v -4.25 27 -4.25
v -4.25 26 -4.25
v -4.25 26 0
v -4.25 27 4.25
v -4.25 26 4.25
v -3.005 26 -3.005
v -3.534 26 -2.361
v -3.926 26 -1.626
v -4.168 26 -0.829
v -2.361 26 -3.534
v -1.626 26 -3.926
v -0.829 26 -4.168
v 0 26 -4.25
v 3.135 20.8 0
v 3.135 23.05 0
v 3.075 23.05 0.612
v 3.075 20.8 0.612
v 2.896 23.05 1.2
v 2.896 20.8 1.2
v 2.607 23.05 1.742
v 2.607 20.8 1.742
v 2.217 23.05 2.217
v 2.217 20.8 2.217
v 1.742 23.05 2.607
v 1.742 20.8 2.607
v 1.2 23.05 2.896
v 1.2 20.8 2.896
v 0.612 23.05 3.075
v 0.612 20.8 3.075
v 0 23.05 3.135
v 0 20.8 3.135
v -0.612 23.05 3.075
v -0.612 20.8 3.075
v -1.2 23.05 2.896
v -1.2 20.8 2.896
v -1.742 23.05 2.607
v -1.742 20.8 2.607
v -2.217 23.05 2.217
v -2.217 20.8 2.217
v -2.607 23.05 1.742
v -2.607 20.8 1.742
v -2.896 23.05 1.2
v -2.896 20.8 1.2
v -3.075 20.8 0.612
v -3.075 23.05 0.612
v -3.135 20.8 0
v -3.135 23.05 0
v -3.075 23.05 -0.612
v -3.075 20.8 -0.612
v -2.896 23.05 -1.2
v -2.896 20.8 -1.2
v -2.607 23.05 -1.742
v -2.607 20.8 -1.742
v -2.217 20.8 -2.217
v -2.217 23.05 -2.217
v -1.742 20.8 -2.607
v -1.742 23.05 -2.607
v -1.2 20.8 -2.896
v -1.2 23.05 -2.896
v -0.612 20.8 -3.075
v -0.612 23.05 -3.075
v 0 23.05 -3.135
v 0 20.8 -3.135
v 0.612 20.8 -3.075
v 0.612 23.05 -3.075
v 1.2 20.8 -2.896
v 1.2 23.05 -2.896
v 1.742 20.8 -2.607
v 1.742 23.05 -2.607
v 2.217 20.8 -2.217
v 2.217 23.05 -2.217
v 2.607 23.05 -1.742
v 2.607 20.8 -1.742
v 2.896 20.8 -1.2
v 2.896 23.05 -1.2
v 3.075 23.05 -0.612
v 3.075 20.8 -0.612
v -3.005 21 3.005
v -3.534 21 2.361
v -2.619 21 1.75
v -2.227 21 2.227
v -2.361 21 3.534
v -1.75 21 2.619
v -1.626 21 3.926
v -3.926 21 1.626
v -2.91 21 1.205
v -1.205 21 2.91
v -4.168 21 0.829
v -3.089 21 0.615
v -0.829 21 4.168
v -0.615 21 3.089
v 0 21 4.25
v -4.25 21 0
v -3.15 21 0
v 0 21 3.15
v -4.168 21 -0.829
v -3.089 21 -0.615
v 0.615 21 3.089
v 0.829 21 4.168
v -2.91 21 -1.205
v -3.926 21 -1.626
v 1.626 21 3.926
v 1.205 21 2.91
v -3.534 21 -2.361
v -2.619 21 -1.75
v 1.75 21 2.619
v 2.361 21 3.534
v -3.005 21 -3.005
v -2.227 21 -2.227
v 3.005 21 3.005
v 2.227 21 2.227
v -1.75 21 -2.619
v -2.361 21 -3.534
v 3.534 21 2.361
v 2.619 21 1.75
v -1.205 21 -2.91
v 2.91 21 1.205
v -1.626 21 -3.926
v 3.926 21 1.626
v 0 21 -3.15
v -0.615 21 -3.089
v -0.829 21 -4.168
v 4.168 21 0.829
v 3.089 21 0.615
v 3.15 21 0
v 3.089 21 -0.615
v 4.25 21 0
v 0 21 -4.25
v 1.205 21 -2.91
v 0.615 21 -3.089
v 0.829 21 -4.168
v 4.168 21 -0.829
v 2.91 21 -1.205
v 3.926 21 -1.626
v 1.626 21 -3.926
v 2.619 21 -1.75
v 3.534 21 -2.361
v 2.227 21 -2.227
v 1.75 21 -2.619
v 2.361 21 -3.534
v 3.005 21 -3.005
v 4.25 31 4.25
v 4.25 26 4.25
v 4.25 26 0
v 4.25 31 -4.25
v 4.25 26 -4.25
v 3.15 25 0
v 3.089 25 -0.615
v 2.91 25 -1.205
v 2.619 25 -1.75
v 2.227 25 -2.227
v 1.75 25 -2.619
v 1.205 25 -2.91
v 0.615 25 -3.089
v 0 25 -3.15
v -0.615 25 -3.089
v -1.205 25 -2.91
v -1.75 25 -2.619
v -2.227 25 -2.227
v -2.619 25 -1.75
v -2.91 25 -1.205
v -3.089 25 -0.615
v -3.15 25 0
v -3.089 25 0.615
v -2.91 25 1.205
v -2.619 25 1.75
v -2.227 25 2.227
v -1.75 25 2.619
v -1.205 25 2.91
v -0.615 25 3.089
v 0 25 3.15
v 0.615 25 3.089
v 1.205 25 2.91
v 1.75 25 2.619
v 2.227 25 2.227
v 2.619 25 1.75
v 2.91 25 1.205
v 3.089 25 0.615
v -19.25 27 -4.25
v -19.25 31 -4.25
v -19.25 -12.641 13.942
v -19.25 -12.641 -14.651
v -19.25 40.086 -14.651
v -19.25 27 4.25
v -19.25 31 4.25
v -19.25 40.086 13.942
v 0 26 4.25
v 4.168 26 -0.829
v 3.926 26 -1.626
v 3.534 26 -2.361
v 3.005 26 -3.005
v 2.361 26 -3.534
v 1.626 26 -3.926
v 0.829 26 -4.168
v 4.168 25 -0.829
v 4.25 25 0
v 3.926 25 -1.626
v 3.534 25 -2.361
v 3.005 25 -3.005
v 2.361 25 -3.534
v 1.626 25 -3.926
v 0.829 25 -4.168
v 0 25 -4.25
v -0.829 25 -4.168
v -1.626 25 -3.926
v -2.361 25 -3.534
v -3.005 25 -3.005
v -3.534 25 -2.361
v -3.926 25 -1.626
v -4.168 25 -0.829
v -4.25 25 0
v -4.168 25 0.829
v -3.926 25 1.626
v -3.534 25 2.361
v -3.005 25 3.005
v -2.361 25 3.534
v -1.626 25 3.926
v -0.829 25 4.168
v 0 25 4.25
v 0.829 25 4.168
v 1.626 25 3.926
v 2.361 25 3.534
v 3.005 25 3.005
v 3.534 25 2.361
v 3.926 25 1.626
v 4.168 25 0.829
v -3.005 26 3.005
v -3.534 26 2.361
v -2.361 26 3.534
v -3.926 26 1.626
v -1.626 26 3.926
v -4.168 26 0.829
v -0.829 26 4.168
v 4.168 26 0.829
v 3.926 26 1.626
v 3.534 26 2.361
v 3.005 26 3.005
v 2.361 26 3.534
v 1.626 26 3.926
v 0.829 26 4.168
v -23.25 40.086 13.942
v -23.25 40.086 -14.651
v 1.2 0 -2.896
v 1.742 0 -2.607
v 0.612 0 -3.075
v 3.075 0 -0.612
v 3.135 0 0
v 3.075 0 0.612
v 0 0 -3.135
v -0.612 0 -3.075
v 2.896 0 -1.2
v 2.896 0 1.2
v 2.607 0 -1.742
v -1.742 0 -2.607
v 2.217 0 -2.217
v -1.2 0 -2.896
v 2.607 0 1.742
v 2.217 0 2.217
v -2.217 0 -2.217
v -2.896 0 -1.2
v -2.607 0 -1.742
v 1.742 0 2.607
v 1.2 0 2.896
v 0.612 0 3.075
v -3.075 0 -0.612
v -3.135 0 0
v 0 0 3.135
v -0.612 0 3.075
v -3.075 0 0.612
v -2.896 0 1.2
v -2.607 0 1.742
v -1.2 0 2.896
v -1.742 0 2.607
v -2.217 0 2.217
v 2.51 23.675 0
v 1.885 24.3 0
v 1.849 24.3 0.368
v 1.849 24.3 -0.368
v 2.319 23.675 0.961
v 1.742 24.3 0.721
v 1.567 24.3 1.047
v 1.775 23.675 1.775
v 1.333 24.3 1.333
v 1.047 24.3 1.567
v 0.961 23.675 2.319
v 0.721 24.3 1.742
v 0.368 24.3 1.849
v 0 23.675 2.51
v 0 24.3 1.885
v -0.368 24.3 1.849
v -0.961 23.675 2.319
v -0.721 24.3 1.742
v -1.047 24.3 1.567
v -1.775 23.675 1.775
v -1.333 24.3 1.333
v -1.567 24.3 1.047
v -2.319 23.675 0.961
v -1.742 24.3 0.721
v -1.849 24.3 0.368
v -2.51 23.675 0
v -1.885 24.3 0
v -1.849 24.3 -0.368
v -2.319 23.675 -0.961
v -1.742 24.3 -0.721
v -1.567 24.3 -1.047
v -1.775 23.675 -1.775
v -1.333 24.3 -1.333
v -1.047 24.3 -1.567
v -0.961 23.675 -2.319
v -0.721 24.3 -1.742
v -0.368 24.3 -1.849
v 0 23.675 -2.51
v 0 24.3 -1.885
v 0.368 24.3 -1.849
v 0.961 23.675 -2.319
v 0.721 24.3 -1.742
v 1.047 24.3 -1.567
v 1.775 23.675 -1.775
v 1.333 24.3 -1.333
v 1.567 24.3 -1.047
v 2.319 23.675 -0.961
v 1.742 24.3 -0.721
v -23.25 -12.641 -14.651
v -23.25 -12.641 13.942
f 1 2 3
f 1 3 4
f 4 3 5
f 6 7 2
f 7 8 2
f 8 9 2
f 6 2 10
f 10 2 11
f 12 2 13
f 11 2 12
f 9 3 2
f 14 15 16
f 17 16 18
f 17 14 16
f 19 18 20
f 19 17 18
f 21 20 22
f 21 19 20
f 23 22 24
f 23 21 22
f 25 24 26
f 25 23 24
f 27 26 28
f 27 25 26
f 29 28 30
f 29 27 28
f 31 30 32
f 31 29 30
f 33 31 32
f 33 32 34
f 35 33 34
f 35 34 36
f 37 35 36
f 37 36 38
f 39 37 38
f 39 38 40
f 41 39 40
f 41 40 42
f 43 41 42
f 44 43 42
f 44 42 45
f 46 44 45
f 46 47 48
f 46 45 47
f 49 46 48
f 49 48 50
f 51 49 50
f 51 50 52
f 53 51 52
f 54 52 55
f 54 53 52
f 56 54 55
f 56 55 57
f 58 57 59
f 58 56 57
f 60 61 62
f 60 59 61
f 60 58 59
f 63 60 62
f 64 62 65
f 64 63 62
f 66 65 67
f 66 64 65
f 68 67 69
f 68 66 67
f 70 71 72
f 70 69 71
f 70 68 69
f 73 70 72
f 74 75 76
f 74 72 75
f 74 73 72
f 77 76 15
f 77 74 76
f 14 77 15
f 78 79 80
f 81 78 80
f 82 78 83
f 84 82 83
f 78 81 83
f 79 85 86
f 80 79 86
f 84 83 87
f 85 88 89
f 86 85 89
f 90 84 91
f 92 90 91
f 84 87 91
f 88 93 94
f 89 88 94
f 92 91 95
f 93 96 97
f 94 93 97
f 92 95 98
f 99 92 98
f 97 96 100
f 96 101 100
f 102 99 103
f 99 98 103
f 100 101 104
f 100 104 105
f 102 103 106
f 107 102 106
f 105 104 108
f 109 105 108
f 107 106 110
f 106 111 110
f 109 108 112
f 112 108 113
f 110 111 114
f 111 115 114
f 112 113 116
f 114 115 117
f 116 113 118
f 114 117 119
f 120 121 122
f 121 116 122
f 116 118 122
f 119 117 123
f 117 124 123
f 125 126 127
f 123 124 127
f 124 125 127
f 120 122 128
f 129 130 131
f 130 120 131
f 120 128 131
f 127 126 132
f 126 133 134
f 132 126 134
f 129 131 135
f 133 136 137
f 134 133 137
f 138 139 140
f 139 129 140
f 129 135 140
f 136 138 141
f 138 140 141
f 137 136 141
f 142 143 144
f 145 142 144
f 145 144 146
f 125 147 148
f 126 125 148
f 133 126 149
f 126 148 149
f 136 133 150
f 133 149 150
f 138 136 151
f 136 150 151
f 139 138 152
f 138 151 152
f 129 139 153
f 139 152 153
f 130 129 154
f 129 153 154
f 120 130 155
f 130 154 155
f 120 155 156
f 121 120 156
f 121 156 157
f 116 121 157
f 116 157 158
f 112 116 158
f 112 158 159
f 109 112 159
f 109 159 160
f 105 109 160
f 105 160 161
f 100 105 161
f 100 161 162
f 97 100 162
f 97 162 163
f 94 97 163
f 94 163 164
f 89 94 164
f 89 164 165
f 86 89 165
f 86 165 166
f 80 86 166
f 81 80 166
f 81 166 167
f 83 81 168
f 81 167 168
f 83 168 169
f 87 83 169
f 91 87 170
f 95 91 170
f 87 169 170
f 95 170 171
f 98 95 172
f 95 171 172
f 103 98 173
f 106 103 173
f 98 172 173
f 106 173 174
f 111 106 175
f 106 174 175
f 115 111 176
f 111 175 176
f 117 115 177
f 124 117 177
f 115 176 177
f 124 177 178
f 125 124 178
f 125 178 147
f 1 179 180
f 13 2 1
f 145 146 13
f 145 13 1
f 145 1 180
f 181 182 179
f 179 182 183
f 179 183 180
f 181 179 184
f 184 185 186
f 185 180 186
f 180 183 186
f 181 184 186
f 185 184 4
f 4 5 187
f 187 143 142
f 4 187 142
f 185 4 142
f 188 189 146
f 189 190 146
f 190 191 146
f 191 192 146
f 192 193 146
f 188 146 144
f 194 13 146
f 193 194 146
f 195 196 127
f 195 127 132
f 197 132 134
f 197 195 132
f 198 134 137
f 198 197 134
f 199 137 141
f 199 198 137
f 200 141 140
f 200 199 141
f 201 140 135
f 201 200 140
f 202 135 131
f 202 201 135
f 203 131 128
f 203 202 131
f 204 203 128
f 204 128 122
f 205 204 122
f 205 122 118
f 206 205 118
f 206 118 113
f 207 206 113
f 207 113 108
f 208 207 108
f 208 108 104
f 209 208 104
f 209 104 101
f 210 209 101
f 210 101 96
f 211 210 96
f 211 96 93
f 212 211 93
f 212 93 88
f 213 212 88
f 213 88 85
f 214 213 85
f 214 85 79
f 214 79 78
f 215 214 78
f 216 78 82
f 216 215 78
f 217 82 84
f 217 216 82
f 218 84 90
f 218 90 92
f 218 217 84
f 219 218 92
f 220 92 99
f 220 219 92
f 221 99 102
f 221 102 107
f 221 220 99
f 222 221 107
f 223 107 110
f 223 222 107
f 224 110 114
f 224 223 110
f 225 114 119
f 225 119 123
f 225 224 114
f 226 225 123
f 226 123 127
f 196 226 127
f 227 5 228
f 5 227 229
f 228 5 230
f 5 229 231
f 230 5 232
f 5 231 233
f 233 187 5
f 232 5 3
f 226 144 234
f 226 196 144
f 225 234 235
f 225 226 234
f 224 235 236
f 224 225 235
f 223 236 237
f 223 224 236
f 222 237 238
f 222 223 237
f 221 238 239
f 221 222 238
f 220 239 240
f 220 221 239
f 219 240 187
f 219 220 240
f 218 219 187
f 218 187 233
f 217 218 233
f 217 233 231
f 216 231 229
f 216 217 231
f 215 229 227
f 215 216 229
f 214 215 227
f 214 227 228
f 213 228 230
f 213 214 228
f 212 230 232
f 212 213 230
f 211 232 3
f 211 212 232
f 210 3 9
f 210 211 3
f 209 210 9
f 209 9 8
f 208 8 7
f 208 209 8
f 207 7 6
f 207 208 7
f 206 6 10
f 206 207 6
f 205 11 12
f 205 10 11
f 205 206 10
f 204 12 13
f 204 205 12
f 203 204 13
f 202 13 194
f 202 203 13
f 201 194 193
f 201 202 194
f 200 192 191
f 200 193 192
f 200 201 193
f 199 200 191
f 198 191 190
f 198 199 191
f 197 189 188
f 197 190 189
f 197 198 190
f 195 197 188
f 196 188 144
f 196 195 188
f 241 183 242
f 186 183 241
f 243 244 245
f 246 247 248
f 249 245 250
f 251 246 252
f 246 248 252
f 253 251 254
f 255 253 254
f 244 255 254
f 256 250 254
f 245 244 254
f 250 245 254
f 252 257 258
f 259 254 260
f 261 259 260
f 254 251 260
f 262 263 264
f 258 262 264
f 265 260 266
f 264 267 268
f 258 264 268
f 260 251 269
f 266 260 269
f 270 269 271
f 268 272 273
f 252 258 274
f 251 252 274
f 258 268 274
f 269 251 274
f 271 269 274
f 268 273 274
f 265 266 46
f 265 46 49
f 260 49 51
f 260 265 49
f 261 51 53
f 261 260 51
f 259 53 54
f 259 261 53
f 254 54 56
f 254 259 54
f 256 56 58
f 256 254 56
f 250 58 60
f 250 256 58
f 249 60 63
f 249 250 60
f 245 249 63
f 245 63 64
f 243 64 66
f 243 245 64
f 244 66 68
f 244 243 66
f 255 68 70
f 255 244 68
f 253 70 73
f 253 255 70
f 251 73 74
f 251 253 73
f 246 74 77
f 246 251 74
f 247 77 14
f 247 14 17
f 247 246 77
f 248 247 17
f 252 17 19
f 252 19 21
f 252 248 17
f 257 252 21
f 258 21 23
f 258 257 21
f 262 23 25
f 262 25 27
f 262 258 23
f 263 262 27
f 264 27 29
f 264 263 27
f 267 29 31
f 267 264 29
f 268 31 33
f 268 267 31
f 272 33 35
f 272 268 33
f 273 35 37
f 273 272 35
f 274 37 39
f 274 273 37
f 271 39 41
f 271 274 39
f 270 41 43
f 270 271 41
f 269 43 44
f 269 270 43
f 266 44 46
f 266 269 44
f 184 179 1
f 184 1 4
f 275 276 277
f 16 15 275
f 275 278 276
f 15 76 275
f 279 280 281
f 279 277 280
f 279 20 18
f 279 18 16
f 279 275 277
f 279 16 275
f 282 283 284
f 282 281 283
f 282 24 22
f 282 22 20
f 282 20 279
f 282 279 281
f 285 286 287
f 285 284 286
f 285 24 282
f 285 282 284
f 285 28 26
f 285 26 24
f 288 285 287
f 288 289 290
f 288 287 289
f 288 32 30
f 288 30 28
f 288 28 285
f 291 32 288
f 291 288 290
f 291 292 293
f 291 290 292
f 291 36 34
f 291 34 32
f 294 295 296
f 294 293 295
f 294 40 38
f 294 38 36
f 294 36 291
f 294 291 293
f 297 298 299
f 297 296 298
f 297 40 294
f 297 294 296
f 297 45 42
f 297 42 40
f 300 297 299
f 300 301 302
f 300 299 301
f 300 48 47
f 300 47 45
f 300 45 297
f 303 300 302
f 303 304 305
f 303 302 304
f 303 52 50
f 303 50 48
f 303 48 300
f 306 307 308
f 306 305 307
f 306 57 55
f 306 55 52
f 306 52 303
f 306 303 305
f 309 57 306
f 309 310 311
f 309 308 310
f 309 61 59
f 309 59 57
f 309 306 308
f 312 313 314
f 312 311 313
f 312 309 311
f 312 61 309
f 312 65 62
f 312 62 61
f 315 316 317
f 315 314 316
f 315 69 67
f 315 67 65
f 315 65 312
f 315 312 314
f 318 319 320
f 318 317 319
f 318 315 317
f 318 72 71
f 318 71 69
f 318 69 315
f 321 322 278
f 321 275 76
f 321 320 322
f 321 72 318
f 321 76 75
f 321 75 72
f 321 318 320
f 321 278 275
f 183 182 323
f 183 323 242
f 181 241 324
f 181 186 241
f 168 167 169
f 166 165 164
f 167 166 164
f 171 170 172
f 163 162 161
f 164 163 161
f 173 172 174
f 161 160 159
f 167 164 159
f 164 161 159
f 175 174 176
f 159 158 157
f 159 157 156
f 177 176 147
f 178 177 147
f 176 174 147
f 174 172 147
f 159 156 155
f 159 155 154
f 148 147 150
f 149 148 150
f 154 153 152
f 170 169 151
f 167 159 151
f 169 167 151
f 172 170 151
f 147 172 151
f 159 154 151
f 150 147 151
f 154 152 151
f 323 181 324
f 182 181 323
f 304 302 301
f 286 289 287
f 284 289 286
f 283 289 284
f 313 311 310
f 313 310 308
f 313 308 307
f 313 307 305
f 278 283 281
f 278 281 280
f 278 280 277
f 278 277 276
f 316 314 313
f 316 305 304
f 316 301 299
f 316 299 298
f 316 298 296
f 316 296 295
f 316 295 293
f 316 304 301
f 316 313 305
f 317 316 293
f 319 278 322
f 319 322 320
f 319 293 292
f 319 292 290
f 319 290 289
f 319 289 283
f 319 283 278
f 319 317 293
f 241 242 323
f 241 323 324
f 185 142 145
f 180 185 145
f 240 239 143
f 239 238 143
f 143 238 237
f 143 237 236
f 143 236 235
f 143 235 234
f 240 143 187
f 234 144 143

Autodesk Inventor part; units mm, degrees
ref_plane "YZ Plane" through (0, 0, 0) normal (1, 0, 0) x (0, 1, 0)
ref_plane "XZ Plane" through (0, 0, 0) normal (0, 1, 0) x (-1, 0, 0)
ref_plane "XY Plane" through (0, 0, 0) normal (0, 0, 1) x (1, 0, 0)
sketch "Sketch1" plane through (0, 0, 0) normal (0, 1, 0) x (-1, 0, 0)
  circle A0 centre (0, 0) radius 3.135
  dimension "d0" = 6.27
extrude "Extrusion1" add sketch "Sketch1" along normal blind 25
sketch "Sketch3" plane through (0, 25, 0) normal (0, 1, 0) x (1, 0, 0)
  circle A0 centre (0, 0) radius 4.25
  dimension "d3" = 8.5
extrude "Extrusion2" add sketch "Sketch3" against normal blind 4
sketch "Sketch4" plane through (0, 25, 0) normal (0, 1, 0) x (1, 0, 0)
  circle A0 centre (0, 0) radius 3.15
  dimension "d6" = 6.3
extrude "Extrusion3" cut sketch "Sketch4" against normal blind 4.2
sketch "Sketch5" plane through (0, 20.8, 0) normal (0, 1, 0) x (1, 0, 0)
  circle A0 centre (0, 0) radius 3.135
  dimension "d9" = 6.27
extrude "Extrusion4" add sketch "Sketch5" along normal blind 3.5
chamfer "Chamfer1" distance 1.25 angle 45 1 edges at (-3.135, 24.3, 0)
sketch "Sketch6" plane through (0, 25, 0) normal (0, 1, 0) x (1, 0, 0)
  circle A0 centre (0, 0) radius 4.25
extrude "Extrusion5" add sketch "Sketch6" along normal blind 1
sketch "Sketch7" plane through (0, 26, 0) normal (0, 1, 0) x (1, 0, 0)
  line L0 (4.25, 4.25) -> (-4.25, 4.25)
  line L1 (-4.25, 4.25) -> (-4.25, -4.25)
  line L2 (-4.25, -4.25) -> (4.25, -4.25)
  line L3 (4.25, -4.25) -> (4.25, 4.25)
  point P0 (0, 0)
extrude "Extrusion6" add sketch "Sketch7" along normal blind 5
sketch "Sketch8" plane through (-4.25, 26, -4.25) normal (-1, 0, 0) x (0, 0, 1)
  line L0 (8.5, 0) -> (8.5, 5) projected
  line L1 (0, 0) -> (0, 5) projected
  line L2 (8.5, 5) -> (0, 5)
  line L3 (0, 5) -> (0, 1)
  line L4 (0, 1) -> (8.5, 1)
  line L5 (8.5, 1) -> (8.5, 5)
  point P0 (4.25, -26)
  point P1 (8.5, 1)
  dimension "d19" = 4
extrude "Extrusion7" add sketch "Sketch8" along normal blind 15
sketch "Sketch9" plane through (-19.25, 26, -4.25) normal (-1, 0, 0) x (0, 0, 1)
  line L0 (-10.401, 14.0857) -> (18.1917, 14.0857)
  line L1 (18.1917, 14.0857) -> (18.1917, -38.6412)
  line L2 (18.1917, -38.6412) -> (-10.401, -38.6412)
  line L3 (-10.401, -38.6412) -> (-10.401, 14.0857)
  point P0 (4.25, -26)
extrude "Extrusion8" add sketch "Sketch9" along normal blind 4
properties part number "servo_sandboxv2"
